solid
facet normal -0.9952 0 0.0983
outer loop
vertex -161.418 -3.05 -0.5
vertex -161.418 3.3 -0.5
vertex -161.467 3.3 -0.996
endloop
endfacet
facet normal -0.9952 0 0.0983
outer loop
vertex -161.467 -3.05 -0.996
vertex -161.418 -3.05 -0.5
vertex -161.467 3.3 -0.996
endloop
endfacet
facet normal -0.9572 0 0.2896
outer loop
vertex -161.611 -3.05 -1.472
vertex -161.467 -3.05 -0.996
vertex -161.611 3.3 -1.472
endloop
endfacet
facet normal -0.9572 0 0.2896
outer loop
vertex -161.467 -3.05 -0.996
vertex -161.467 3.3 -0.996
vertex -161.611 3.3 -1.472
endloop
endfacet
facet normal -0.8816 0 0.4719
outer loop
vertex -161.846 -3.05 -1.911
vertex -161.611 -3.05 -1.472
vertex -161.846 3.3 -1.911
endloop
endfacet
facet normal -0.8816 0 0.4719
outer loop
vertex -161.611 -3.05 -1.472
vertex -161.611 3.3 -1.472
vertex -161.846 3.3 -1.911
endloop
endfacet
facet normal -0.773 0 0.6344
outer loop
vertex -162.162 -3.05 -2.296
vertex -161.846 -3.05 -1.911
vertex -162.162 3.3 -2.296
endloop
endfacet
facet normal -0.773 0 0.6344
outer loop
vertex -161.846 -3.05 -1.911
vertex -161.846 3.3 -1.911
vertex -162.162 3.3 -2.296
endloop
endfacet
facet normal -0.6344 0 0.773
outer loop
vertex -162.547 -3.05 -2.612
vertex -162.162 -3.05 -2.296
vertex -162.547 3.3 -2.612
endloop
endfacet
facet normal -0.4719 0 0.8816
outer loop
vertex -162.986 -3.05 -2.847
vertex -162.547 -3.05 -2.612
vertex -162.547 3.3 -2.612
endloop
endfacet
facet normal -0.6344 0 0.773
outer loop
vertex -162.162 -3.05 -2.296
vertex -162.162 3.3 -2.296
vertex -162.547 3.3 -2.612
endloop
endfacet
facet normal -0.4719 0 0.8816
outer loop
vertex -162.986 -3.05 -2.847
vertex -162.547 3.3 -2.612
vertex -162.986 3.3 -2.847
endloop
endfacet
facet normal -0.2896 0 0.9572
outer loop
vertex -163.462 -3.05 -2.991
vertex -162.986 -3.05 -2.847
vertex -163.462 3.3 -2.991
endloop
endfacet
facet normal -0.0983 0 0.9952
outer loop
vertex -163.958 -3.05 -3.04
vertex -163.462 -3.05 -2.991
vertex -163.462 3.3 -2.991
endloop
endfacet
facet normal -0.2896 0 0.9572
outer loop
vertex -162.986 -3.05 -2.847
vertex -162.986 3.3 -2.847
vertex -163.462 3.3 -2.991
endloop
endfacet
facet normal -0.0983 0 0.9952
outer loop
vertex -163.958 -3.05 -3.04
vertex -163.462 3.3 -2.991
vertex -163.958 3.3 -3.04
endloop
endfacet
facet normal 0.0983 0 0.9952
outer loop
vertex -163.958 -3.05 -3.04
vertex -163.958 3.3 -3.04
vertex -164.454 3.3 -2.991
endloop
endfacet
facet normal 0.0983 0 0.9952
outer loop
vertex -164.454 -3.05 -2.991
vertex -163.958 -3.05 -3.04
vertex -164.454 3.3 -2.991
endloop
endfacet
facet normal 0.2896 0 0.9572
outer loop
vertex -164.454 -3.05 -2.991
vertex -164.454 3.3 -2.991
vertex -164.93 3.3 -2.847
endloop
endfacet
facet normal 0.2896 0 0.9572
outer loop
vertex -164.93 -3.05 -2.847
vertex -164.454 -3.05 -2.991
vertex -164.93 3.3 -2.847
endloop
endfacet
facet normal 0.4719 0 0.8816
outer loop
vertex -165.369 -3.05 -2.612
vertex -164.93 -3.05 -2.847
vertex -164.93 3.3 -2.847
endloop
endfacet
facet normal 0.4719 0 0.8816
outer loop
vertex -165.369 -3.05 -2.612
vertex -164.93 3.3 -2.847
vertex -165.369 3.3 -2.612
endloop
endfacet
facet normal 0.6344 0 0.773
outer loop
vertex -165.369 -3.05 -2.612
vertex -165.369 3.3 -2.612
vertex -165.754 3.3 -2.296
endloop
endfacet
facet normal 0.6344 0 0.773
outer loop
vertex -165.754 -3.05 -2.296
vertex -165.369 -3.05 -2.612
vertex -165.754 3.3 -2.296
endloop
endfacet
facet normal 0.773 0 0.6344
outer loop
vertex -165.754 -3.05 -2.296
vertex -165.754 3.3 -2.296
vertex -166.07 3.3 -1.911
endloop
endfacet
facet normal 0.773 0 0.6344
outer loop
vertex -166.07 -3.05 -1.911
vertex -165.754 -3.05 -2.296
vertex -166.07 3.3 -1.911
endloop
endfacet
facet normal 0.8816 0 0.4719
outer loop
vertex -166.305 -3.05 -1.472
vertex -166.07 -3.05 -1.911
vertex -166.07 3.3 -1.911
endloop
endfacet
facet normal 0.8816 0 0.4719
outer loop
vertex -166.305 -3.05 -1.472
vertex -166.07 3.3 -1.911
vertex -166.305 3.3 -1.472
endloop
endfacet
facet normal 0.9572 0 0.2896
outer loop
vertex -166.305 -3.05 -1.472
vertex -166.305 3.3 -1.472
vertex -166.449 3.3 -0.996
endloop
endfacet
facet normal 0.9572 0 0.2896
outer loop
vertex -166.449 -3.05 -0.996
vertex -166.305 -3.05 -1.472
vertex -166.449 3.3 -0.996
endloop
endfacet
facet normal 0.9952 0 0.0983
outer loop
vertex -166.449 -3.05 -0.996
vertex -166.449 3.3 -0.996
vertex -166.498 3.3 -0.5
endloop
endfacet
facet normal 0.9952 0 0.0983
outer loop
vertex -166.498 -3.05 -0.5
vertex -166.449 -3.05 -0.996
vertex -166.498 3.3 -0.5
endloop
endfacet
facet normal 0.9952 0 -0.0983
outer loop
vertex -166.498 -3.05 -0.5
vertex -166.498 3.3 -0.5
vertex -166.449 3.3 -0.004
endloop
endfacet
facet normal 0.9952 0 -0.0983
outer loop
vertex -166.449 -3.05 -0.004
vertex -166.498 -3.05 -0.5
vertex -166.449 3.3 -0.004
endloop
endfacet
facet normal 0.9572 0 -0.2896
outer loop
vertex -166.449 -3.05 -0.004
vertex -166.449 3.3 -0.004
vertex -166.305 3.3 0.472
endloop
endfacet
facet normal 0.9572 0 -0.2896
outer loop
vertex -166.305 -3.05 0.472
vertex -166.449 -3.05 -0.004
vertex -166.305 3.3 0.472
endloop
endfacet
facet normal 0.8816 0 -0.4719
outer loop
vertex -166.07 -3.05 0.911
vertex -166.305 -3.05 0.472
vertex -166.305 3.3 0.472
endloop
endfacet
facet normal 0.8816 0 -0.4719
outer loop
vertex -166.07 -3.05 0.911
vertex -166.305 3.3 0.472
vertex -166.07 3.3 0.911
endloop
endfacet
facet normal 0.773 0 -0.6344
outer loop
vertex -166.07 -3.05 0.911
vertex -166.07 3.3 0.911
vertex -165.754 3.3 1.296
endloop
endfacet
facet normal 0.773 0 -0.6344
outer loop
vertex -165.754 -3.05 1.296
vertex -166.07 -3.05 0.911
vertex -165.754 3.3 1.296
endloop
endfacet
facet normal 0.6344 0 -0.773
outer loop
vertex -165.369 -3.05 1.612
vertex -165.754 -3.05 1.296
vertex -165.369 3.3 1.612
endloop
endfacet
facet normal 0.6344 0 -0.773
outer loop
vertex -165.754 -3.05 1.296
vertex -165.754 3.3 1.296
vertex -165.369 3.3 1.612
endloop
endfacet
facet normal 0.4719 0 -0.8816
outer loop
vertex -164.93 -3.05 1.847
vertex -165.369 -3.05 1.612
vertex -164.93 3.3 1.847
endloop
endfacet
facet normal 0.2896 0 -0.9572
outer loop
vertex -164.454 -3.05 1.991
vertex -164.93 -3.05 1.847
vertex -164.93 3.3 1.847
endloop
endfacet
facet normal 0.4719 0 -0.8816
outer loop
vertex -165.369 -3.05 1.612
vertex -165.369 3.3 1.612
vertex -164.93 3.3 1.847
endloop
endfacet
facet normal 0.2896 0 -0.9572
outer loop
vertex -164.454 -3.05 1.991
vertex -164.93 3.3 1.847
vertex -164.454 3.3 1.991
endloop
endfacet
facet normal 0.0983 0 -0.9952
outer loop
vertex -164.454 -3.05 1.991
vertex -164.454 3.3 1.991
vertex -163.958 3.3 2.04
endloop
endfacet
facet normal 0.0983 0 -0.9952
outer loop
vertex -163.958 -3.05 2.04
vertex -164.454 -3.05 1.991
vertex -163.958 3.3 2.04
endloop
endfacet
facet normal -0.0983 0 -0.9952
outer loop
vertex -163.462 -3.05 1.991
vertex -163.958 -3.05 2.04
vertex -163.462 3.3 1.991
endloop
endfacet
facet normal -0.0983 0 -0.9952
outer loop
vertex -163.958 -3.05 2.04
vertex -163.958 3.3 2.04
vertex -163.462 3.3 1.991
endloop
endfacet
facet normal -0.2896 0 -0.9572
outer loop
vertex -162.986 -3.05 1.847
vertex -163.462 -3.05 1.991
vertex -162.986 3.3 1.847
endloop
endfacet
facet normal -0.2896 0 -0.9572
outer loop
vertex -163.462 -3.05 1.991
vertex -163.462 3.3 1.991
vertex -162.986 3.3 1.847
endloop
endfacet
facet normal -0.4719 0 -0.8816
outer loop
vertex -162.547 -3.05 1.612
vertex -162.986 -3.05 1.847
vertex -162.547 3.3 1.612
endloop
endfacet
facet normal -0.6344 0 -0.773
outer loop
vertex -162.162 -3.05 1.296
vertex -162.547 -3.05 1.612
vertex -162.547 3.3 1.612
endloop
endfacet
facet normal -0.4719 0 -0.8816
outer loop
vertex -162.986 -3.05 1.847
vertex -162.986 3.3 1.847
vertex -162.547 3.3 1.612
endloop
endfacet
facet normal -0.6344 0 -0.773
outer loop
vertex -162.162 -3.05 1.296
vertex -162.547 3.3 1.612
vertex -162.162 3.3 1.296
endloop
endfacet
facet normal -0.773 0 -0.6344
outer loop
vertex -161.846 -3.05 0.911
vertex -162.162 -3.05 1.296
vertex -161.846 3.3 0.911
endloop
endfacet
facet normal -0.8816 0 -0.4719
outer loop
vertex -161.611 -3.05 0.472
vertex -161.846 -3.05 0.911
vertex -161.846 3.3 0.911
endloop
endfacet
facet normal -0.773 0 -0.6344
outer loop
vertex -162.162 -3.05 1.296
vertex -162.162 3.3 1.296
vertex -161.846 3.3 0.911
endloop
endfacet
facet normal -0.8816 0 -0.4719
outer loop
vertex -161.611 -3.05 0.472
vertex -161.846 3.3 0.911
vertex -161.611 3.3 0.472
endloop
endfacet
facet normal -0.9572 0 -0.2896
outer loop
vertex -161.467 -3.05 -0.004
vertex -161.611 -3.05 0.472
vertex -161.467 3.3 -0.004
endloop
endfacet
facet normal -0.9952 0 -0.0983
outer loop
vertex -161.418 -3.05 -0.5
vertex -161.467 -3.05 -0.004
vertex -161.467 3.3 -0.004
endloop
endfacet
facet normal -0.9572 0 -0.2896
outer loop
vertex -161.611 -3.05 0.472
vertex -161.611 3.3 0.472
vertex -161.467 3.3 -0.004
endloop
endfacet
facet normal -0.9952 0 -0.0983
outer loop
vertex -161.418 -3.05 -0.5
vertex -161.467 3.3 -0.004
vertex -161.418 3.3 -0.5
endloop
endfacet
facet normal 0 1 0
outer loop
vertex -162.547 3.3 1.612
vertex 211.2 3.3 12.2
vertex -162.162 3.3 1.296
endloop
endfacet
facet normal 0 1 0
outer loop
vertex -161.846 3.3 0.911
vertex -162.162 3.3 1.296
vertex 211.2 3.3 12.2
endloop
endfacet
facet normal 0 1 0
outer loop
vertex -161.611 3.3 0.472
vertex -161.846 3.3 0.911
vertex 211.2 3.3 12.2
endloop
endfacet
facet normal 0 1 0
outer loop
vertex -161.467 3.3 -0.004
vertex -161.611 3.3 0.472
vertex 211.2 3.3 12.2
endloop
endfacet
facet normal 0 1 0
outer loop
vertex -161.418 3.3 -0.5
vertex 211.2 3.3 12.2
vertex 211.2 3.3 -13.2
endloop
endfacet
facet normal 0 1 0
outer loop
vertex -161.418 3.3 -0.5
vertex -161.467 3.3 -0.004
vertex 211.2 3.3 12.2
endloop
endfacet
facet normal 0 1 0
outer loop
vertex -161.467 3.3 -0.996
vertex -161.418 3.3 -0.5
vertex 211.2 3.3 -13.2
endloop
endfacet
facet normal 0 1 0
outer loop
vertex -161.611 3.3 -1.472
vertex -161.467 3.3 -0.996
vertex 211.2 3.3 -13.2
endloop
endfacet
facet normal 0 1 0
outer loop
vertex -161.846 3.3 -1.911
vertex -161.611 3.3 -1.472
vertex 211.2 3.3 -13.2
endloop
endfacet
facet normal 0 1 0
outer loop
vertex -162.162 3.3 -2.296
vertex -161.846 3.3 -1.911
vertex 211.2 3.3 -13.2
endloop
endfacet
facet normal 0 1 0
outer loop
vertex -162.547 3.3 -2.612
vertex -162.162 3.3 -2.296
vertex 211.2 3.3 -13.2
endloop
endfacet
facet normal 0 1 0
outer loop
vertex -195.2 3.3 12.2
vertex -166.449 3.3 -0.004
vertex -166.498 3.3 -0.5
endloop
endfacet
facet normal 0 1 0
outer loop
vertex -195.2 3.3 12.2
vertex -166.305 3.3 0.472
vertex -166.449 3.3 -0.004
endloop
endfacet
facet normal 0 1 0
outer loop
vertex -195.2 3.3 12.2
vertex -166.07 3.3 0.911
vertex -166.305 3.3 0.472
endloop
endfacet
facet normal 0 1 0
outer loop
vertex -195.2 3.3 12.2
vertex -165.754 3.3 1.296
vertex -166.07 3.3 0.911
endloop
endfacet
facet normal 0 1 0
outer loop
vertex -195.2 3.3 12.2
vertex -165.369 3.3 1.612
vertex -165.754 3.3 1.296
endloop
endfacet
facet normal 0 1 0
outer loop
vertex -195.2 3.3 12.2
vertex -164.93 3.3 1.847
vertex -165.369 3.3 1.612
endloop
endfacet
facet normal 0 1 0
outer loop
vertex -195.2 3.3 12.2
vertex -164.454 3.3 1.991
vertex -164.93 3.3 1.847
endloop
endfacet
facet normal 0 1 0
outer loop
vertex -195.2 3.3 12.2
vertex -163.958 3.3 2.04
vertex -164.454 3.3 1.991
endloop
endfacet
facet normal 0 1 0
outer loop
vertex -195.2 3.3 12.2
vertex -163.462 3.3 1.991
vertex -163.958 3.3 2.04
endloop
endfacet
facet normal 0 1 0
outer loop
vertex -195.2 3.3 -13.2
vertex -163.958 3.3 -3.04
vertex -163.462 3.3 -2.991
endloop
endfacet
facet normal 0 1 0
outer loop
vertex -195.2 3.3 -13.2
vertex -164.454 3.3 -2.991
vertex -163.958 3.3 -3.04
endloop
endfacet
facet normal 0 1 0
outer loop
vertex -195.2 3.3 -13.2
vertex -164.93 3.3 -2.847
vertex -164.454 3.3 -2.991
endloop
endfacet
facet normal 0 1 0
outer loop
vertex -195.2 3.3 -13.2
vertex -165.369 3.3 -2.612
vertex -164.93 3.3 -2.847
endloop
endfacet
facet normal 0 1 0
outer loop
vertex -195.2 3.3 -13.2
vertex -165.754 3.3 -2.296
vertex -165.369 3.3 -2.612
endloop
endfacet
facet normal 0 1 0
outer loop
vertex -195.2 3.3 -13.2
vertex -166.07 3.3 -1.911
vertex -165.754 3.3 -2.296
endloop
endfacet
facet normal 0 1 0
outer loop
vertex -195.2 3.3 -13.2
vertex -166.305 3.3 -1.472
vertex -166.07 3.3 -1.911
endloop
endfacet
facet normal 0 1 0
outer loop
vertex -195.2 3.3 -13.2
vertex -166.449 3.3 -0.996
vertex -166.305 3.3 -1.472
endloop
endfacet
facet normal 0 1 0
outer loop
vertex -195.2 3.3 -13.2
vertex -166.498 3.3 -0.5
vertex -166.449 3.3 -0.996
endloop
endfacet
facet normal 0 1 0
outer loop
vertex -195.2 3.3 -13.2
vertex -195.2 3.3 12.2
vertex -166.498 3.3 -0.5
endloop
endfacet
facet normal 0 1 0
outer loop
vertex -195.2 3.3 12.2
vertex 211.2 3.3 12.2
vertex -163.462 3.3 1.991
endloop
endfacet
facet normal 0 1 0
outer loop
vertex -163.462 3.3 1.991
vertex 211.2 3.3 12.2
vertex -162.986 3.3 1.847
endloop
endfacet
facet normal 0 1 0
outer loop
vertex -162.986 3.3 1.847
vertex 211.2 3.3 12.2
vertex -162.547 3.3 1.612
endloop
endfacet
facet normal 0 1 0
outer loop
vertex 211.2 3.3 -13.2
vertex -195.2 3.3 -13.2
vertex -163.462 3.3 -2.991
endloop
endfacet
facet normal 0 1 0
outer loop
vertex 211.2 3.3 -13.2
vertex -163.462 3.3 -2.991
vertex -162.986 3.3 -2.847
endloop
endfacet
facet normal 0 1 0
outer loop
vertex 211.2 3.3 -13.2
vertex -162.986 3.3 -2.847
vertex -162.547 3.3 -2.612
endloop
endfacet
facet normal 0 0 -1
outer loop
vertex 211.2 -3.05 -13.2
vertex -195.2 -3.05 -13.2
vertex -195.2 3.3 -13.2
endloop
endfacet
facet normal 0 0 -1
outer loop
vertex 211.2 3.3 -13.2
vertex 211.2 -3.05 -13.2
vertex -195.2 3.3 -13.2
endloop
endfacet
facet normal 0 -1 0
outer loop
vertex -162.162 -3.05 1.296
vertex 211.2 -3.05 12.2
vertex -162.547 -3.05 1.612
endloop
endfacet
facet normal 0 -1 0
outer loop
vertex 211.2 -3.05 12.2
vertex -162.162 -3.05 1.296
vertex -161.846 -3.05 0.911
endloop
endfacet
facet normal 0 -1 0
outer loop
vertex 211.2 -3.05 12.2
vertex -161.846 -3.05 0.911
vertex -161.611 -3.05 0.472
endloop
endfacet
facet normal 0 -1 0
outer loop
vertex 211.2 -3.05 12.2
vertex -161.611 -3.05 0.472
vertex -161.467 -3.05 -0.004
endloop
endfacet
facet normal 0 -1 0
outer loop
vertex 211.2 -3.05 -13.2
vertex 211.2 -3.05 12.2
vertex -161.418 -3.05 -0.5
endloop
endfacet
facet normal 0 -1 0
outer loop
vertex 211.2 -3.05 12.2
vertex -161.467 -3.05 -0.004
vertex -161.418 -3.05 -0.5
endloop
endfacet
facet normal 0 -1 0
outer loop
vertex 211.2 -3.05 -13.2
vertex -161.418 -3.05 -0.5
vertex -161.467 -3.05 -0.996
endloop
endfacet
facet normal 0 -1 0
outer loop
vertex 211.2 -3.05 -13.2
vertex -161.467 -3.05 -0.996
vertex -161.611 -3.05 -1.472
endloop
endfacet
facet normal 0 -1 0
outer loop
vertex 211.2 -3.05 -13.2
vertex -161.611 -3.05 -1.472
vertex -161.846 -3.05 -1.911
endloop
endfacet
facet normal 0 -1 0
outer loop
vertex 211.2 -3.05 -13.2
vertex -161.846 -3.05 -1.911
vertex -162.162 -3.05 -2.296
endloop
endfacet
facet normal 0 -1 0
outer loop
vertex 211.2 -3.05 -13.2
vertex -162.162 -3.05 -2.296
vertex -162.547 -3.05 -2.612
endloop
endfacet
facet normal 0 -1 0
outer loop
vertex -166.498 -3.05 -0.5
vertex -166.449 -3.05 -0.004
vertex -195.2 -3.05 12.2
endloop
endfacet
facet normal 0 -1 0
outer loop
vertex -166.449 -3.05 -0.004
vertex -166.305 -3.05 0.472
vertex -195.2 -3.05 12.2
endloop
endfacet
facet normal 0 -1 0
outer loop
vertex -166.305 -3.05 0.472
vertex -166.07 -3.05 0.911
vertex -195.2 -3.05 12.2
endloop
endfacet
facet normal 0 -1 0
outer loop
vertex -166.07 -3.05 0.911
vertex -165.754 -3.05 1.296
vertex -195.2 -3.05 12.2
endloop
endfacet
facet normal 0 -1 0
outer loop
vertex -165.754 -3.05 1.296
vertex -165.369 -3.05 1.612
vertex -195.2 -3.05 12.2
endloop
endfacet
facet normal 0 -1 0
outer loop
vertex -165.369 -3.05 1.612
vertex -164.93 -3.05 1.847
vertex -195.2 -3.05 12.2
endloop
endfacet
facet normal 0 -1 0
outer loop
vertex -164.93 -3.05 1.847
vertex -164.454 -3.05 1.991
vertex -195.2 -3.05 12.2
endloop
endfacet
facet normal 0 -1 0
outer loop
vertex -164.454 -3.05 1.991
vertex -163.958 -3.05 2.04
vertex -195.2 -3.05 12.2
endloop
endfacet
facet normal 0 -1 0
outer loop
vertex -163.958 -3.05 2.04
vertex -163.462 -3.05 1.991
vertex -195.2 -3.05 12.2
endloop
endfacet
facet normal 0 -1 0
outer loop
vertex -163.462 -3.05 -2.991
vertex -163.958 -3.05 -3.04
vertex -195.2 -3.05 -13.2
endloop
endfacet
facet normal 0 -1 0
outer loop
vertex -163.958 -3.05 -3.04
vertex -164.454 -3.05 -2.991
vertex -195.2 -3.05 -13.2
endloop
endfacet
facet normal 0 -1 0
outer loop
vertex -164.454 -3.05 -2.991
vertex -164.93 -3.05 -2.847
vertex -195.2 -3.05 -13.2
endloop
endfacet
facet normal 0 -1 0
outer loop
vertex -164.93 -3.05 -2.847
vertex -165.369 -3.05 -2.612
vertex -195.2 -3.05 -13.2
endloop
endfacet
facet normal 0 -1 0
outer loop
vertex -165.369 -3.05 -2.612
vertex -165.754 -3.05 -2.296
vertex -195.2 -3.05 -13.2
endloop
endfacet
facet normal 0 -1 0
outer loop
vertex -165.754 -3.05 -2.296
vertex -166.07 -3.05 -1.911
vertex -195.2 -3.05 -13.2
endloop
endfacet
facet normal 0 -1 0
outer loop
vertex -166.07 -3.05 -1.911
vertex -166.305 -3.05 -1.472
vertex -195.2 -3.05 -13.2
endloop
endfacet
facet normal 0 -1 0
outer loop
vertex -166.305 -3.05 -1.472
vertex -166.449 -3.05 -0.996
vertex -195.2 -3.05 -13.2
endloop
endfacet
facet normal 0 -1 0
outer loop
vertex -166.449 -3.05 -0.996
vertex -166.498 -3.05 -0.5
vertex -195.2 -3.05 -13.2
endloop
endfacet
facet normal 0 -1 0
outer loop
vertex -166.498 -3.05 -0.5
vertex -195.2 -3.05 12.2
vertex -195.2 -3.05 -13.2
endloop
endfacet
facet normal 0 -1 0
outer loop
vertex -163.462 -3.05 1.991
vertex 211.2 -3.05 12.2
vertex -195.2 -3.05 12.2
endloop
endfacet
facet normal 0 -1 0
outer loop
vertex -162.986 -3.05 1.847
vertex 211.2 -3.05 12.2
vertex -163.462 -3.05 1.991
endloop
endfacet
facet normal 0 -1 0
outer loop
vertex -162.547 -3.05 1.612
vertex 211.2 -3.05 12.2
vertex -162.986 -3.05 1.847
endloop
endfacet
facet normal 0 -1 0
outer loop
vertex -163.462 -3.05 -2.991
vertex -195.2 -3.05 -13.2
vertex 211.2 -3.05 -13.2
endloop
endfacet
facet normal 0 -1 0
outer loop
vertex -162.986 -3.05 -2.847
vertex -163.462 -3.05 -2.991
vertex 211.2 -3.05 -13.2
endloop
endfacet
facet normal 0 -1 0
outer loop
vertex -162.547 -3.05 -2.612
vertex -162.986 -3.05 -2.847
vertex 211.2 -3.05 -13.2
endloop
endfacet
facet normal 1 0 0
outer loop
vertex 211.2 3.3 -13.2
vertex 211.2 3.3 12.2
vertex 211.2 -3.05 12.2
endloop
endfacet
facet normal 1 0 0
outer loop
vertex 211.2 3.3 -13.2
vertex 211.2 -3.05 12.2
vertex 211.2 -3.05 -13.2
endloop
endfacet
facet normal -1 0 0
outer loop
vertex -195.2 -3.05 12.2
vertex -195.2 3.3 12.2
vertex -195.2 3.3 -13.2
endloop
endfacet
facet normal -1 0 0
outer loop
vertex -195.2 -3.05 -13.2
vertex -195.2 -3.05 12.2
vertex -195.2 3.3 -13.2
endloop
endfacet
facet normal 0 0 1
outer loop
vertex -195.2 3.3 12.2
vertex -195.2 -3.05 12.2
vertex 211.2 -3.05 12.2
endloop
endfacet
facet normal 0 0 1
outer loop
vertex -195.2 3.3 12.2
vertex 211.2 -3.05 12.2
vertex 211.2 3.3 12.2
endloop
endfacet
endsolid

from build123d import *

# Parameters (mm, degrees)
SKETCH1_W           = 1
SKETCH1_H           = 0.25
BOSS_EXTRUDE1_DEPTH = 16
SCALE1_SCALE        = 25.4
SKETCH2_R           = 2.54
CUT_EXTRUDE1_DEPTH  = 7.35


with BuildPart() as part:
    # Sketch1 → Boss-Extrude1 (new body)
    with BuildSketch(Plane(origin=(0, 0, 0), x_dir=(0, 0, -1), z_dir=(1, 0, 0))):
        with Locations((0.5, 0.125)):
            Rectangle(SKETCH1_W, SKETCH1_H)
    extrude(amount=BOSS_EXTRUDE1_DEPTH)


with BuildPart() as part_1:
    # Scale1: scaled about (8, 0.125, -0.5)
    add(part.part.scale(SCALE1_SCALE).moved(Location((-195.2, -3.05, 12.2))))

    # Sketch2 → Cut-Extrude1 (cut, through all)
    with BuildSketch(Plane(origin=(0, 3.3, 0), x_dir=(1, 0, 0), z_dir=(0, 1, 0))):
        with Locations((-163.958, 0.5)):
            Circle(SKETCH2_R)
    extrude(amount=-CUT_EXTRUDE1_DEPTH, mode=Mode.SUBTRACT)


solid = part_1.part
